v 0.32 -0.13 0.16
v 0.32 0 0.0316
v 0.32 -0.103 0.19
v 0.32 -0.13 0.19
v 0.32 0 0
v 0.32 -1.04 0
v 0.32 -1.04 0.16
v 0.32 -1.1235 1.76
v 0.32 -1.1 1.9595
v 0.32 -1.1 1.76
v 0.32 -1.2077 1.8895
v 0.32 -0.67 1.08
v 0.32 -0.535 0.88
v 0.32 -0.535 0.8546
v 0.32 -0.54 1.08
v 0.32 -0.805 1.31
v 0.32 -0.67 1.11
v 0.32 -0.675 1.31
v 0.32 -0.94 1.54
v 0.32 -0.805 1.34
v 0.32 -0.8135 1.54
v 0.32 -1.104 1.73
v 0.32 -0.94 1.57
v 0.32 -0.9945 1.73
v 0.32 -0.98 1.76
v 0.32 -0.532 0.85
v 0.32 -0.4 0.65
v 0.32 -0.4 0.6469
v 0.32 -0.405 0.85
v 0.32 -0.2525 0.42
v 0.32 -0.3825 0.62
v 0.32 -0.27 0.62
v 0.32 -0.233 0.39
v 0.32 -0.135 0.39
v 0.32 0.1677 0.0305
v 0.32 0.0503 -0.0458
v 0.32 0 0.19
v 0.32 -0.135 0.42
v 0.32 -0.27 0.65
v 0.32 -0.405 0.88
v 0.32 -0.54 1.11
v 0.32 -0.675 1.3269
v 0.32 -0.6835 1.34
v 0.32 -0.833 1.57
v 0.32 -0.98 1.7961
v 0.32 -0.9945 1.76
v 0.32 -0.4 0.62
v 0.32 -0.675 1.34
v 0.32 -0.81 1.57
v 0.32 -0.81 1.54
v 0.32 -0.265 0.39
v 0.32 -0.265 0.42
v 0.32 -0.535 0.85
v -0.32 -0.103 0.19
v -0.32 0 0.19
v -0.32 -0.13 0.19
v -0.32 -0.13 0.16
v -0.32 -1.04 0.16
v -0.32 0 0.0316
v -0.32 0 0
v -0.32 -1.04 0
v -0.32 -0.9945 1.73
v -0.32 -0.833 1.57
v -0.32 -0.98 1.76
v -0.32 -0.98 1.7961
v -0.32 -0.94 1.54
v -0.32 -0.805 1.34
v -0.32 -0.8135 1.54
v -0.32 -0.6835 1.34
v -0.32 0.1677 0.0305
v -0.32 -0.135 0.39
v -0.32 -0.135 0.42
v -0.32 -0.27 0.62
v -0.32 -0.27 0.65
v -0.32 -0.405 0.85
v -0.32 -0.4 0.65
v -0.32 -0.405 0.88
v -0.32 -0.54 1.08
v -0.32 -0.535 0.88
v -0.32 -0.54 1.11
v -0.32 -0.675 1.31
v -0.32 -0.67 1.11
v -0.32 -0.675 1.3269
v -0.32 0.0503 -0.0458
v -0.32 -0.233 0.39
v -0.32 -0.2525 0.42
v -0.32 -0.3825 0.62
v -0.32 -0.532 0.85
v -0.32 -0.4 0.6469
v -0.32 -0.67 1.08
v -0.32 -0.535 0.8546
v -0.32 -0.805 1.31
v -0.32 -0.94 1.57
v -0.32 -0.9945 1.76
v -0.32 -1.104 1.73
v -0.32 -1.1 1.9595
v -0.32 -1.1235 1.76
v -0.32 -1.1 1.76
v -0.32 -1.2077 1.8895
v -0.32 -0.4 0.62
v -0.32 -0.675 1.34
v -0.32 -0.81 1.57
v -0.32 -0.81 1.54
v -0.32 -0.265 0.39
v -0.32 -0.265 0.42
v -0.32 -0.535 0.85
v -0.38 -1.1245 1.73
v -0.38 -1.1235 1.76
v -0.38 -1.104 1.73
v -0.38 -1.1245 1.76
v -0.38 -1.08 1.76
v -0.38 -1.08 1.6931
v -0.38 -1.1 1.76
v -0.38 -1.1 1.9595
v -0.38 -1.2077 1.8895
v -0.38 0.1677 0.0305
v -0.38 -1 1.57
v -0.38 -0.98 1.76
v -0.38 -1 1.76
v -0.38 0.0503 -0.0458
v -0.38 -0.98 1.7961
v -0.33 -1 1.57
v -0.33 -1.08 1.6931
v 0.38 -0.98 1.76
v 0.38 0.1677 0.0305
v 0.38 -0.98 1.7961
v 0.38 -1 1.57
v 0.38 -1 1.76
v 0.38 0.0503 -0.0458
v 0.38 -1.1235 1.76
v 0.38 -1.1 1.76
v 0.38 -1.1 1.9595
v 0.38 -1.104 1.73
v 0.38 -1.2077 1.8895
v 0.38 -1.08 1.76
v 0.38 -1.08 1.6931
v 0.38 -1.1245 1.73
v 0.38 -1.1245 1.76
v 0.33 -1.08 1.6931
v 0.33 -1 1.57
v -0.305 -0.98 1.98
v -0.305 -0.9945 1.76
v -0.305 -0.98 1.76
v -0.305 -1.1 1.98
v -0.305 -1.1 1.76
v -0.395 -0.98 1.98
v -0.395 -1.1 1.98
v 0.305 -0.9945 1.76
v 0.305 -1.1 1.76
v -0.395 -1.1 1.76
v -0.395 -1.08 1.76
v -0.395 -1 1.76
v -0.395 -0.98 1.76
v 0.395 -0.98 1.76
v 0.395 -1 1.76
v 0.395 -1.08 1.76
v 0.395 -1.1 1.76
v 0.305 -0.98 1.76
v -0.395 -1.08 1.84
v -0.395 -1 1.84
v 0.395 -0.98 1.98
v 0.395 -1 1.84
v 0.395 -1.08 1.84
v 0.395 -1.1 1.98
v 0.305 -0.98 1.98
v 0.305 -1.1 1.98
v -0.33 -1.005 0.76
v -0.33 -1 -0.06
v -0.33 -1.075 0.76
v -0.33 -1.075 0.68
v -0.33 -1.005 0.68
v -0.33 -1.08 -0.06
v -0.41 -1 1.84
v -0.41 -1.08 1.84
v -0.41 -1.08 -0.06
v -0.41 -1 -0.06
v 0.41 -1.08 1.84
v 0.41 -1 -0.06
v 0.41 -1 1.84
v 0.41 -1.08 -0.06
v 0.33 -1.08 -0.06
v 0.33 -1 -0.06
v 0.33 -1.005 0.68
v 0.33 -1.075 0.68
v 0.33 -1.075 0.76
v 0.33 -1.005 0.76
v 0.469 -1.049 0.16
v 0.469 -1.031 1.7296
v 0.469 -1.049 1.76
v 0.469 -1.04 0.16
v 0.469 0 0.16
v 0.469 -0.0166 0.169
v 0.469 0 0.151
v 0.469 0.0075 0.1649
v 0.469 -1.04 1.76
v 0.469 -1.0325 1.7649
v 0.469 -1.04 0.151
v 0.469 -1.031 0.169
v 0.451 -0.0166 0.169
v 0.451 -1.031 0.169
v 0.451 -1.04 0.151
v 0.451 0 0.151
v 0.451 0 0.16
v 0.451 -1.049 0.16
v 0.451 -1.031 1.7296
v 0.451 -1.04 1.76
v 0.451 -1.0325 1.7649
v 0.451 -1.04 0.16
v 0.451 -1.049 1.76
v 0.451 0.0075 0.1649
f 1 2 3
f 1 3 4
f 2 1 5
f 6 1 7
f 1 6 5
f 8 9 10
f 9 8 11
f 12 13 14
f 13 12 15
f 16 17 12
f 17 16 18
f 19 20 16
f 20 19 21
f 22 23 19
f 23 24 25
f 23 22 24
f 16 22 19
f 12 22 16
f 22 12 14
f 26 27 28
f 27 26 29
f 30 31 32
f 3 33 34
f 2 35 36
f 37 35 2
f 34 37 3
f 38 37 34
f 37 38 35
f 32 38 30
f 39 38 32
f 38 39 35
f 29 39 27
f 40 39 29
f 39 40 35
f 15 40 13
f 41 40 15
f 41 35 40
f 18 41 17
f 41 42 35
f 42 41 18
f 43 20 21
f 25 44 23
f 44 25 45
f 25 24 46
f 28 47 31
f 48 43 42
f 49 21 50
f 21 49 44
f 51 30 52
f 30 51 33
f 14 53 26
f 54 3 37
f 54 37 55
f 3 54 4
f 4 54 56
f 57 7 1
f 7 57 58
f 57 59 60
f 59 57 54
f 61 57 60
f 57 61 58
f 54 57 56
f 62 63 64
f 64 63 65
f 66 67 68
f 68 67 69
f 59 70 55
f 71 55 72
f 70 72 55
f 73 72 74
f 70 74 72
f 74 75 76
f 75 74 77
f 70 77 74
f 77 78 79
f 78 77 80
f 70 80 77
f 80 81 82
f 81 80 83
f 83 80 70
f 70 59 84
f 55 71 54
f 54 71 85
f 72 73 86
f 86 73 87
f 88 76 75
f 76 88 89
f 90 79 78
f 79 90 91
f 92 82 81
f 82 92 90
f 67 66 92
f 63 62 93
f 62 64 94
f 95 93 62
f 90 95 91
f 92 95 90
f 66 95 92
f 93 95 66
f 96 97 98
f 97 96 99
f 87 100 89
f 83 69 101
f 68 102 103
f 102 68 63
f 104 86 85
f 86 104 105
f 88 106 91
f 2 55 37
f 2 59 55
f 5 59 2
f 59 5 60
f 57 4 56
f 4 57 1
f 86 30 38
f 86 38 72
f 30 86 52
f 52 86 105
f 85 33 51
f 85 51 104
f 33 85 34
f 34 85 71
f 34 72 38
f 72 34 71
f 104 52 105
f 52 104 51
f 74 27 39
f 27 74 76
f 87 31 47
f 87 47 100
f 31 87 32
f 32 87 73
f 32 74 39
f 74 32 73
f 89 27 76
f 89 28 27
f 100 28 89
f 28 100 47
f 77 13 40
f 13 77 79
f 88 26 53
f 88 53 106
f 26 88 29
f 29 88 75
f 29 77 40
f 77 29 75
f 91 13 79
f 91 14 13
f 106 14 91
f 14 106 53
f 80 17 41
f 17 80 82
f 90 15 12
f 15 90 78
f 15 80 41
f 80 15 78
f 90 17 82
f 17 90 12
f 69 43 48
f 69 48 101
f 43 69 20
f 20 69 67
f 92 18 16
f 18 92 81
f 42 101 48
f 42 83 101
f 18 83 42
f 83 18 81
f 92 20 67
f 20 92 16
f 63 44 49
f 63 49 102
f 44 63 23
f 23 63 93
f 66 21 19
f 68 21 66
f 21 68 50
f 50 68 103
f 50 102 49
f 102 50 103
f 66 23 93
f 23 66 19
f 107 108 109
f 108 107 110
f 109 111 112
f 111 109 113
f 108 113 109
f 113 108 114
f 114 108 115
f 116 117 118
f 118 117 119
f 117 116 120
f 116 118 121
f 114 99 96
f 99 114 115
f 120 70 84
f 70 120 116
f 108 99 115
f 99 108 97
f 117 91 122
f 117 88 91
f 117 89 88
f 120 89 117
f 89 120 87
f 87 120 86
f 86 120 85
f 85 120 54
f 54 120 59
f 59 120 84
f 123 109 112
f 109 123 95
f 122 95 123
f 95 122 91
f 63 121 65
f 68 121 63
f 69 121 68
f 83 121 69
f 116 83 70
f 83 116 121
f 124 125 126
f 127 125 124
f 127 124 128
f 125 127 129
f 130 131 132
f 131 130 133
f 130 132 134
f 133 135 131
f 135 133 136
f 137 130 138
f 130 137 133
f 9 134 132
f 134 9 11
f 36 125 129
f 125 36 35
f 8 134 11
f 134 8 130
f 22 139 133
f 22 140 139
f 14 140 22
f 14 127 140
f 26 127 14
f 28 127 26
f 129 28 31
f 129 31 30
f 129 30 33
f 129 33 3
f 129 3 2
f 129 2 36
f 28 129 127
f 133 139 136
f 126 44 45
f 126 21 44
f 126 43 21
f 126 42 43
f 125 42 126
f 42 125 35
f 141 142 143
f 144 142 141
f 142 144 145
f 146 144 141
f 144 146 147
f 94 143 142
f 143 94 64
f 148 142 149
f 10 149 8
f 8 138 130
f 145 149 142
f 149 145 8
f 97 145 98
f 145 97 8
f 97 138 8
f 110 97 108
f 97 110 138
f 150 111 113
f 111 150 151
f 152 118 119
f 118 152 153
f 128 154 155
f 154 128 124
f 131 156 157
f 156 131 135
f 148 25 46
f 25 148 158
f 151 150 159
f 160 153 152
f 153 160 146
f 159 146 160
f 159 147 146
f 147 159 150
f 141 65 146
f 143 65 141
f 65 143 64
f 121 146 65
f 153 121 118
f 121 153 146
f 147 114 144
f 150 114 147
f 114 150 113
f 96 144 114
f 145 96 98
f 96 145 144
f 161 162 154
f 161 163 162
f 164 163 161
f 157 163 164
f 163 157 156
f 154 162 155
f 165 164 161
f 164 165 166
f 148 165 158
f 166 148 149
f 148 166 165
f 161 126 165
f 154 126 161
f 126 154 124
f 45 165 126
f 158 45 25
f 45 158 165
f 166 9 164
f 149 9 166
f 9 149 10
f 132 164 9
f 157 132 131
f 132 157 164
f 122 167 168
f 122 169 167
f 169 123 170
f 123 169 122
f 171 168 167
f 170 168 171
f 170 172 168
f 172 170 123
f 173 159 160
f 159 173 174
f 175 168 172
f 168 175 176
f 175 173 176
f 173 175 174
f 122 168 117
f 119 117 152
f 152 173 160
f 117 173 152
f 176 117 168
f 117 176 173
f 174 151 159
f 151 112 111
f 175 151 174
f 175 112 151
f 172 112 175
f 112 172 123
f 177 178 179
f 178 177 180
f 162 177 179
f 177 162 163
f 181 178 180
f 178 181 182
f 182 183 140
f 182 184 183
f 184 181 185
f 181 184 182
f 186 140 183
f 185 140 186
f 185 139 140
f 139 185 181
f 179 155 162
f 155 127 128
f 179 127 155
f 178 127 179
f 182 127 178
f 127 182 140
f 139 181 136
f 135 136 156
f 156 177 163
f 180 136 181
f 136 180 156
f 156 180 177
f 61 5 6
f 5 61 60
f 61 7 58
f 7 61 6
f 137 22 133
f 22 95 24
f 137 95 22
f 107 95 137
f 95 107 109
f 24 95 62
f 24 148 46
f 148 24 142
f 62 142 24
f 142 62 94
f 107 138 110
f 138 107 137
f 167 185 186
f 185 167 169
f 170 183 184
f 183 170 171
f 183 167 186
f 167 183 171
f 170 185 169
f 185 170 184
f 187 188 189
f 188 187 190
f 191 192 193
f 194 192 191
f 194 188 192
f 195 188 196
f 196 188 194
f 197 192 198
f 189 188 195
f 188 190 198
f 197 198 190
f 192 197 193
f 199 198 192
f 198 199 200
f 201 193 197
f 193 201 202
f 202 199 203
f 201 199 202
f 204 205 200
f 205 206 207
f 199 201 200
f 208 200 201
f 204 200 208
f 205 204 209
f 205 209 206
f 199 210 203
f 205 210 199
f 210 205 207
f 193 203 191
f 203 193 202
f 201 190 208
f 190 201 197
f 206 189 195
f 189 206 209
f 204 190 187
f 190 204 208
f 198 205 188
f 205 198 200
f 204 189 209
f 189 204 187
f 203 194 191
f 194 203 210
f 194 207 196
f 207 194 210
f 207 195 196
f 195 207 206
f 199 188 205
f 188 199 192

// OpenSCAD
// Wood step ladder parametric OpenSCAD model
// Units: meters

total_h = 1.6;
front_run = 1.04;
base_h = 0.16;
base_w = 0.64;
base_l = 1.04;
step_count = 7;
step_w = 0.64;
step_d = 0.13;
step_t = 0.03;
step_top_spacing = 0.23;
step_y_spacing = 0.135;
rear_spread = 1.04;
side_t = 0.06;
side_d = 0.14;
top_d = 0.13;
top_t = 0.03;
rear_beam_h = 0.72;
top_z = base_h + total_h;

module box(size) { cube(size, center=true); }

function y_from_z(z) = -(z - base_h) * front_run / total_h;
function step_top_z(i) = base_h + step_t + i * step_top_spacing;
function step_front_y(i) = -i * step_y_spacing;

translate([0, -base_l / 2, base_h / 2])
    box([base_w, base_l, base_h]);

for (i = [0:step_count - 1]) {
    step_z = step_top_z(i);
    center_z = step_z - step_t / 2;
    translate([0, step_front_y(i) - step_d / 2, center_z])
        box([step_w, step_d, step_t]);
}

front_phi = atan2(total_h, front_run);
rail_len = sqrt(pow(total_h, 2) + pow(front_run, 2)) + 0.4;
rail_mid_y = y_from_z(top_z) / 2;
rail_mid_z = (base_h + top_z) / 2;

for (x = [-step_w/2 - side_t/2, step_w/2 + side_t/2]) {
    translate([x, rail_mid_y, rail_mid_z])
        rotate([90-front_phi, 0, 0])
            box([side_t, side_d, rail_len]);
}

top_y = y_from_z(top_z);
translate([0, top_y - top_d * 0.15, top_z - top_t / 2])
    box([step_w + 0.12, top_d, top_t]);

for (x = [-step_w/2 - side_t/2, step_w/2 + side_t/2]) {
    translate([x, top_y, top_z + 0.11])
        box([0.09, 0.12, 0.22]);
}

rear_y = y_from_z(base_h) - rear_spread;
rear_mid_y = (rear_y + top_y) / 2;
rear_mid_z = (0.02 + top_z) / 2;
rear_angle = atan2(top_z - 0.02, top_y - rear_y);

for (x = [-step_w/2 - 0.05, step_w/2 + 0.05]) {
    translate([x, rear_mid_y, rear_mid_z])
        rotate([90-rear_angle, 0, 0])
            box([0.08, 0.08, (top_z - 0.02) / sin(rear_angle) + 0.16]);
}

translate([0, rear_y + (top_y - rear_y) * (rear_beam_h / total_h), rear_beam_h])
    box([step_w + 0.12, 0.07, 0.08]);

// Visual-only measurement triangle: green run, blue height, red hypotenuse.
translate([step_w / 2 + side_t + 0.08, -front_run / 2, base_h])
    color("green") box([0.018, front_run, 0.018]);
translate([step_w / 2 + side_t + 0.08, -front_run, base_h + total_h / 2])
    color("blue") box([0.018, 0.018, total_h]);
translate([step_w / 2 + side_t + 0.08, -front_run / 2, base_h + total_h / 2])
    rotate([90-front_phi, 0, 0])
        color("red") box([0.018, 0.018, sqrt(pow(total_h, 2) + pow(front_run, 2))]);
